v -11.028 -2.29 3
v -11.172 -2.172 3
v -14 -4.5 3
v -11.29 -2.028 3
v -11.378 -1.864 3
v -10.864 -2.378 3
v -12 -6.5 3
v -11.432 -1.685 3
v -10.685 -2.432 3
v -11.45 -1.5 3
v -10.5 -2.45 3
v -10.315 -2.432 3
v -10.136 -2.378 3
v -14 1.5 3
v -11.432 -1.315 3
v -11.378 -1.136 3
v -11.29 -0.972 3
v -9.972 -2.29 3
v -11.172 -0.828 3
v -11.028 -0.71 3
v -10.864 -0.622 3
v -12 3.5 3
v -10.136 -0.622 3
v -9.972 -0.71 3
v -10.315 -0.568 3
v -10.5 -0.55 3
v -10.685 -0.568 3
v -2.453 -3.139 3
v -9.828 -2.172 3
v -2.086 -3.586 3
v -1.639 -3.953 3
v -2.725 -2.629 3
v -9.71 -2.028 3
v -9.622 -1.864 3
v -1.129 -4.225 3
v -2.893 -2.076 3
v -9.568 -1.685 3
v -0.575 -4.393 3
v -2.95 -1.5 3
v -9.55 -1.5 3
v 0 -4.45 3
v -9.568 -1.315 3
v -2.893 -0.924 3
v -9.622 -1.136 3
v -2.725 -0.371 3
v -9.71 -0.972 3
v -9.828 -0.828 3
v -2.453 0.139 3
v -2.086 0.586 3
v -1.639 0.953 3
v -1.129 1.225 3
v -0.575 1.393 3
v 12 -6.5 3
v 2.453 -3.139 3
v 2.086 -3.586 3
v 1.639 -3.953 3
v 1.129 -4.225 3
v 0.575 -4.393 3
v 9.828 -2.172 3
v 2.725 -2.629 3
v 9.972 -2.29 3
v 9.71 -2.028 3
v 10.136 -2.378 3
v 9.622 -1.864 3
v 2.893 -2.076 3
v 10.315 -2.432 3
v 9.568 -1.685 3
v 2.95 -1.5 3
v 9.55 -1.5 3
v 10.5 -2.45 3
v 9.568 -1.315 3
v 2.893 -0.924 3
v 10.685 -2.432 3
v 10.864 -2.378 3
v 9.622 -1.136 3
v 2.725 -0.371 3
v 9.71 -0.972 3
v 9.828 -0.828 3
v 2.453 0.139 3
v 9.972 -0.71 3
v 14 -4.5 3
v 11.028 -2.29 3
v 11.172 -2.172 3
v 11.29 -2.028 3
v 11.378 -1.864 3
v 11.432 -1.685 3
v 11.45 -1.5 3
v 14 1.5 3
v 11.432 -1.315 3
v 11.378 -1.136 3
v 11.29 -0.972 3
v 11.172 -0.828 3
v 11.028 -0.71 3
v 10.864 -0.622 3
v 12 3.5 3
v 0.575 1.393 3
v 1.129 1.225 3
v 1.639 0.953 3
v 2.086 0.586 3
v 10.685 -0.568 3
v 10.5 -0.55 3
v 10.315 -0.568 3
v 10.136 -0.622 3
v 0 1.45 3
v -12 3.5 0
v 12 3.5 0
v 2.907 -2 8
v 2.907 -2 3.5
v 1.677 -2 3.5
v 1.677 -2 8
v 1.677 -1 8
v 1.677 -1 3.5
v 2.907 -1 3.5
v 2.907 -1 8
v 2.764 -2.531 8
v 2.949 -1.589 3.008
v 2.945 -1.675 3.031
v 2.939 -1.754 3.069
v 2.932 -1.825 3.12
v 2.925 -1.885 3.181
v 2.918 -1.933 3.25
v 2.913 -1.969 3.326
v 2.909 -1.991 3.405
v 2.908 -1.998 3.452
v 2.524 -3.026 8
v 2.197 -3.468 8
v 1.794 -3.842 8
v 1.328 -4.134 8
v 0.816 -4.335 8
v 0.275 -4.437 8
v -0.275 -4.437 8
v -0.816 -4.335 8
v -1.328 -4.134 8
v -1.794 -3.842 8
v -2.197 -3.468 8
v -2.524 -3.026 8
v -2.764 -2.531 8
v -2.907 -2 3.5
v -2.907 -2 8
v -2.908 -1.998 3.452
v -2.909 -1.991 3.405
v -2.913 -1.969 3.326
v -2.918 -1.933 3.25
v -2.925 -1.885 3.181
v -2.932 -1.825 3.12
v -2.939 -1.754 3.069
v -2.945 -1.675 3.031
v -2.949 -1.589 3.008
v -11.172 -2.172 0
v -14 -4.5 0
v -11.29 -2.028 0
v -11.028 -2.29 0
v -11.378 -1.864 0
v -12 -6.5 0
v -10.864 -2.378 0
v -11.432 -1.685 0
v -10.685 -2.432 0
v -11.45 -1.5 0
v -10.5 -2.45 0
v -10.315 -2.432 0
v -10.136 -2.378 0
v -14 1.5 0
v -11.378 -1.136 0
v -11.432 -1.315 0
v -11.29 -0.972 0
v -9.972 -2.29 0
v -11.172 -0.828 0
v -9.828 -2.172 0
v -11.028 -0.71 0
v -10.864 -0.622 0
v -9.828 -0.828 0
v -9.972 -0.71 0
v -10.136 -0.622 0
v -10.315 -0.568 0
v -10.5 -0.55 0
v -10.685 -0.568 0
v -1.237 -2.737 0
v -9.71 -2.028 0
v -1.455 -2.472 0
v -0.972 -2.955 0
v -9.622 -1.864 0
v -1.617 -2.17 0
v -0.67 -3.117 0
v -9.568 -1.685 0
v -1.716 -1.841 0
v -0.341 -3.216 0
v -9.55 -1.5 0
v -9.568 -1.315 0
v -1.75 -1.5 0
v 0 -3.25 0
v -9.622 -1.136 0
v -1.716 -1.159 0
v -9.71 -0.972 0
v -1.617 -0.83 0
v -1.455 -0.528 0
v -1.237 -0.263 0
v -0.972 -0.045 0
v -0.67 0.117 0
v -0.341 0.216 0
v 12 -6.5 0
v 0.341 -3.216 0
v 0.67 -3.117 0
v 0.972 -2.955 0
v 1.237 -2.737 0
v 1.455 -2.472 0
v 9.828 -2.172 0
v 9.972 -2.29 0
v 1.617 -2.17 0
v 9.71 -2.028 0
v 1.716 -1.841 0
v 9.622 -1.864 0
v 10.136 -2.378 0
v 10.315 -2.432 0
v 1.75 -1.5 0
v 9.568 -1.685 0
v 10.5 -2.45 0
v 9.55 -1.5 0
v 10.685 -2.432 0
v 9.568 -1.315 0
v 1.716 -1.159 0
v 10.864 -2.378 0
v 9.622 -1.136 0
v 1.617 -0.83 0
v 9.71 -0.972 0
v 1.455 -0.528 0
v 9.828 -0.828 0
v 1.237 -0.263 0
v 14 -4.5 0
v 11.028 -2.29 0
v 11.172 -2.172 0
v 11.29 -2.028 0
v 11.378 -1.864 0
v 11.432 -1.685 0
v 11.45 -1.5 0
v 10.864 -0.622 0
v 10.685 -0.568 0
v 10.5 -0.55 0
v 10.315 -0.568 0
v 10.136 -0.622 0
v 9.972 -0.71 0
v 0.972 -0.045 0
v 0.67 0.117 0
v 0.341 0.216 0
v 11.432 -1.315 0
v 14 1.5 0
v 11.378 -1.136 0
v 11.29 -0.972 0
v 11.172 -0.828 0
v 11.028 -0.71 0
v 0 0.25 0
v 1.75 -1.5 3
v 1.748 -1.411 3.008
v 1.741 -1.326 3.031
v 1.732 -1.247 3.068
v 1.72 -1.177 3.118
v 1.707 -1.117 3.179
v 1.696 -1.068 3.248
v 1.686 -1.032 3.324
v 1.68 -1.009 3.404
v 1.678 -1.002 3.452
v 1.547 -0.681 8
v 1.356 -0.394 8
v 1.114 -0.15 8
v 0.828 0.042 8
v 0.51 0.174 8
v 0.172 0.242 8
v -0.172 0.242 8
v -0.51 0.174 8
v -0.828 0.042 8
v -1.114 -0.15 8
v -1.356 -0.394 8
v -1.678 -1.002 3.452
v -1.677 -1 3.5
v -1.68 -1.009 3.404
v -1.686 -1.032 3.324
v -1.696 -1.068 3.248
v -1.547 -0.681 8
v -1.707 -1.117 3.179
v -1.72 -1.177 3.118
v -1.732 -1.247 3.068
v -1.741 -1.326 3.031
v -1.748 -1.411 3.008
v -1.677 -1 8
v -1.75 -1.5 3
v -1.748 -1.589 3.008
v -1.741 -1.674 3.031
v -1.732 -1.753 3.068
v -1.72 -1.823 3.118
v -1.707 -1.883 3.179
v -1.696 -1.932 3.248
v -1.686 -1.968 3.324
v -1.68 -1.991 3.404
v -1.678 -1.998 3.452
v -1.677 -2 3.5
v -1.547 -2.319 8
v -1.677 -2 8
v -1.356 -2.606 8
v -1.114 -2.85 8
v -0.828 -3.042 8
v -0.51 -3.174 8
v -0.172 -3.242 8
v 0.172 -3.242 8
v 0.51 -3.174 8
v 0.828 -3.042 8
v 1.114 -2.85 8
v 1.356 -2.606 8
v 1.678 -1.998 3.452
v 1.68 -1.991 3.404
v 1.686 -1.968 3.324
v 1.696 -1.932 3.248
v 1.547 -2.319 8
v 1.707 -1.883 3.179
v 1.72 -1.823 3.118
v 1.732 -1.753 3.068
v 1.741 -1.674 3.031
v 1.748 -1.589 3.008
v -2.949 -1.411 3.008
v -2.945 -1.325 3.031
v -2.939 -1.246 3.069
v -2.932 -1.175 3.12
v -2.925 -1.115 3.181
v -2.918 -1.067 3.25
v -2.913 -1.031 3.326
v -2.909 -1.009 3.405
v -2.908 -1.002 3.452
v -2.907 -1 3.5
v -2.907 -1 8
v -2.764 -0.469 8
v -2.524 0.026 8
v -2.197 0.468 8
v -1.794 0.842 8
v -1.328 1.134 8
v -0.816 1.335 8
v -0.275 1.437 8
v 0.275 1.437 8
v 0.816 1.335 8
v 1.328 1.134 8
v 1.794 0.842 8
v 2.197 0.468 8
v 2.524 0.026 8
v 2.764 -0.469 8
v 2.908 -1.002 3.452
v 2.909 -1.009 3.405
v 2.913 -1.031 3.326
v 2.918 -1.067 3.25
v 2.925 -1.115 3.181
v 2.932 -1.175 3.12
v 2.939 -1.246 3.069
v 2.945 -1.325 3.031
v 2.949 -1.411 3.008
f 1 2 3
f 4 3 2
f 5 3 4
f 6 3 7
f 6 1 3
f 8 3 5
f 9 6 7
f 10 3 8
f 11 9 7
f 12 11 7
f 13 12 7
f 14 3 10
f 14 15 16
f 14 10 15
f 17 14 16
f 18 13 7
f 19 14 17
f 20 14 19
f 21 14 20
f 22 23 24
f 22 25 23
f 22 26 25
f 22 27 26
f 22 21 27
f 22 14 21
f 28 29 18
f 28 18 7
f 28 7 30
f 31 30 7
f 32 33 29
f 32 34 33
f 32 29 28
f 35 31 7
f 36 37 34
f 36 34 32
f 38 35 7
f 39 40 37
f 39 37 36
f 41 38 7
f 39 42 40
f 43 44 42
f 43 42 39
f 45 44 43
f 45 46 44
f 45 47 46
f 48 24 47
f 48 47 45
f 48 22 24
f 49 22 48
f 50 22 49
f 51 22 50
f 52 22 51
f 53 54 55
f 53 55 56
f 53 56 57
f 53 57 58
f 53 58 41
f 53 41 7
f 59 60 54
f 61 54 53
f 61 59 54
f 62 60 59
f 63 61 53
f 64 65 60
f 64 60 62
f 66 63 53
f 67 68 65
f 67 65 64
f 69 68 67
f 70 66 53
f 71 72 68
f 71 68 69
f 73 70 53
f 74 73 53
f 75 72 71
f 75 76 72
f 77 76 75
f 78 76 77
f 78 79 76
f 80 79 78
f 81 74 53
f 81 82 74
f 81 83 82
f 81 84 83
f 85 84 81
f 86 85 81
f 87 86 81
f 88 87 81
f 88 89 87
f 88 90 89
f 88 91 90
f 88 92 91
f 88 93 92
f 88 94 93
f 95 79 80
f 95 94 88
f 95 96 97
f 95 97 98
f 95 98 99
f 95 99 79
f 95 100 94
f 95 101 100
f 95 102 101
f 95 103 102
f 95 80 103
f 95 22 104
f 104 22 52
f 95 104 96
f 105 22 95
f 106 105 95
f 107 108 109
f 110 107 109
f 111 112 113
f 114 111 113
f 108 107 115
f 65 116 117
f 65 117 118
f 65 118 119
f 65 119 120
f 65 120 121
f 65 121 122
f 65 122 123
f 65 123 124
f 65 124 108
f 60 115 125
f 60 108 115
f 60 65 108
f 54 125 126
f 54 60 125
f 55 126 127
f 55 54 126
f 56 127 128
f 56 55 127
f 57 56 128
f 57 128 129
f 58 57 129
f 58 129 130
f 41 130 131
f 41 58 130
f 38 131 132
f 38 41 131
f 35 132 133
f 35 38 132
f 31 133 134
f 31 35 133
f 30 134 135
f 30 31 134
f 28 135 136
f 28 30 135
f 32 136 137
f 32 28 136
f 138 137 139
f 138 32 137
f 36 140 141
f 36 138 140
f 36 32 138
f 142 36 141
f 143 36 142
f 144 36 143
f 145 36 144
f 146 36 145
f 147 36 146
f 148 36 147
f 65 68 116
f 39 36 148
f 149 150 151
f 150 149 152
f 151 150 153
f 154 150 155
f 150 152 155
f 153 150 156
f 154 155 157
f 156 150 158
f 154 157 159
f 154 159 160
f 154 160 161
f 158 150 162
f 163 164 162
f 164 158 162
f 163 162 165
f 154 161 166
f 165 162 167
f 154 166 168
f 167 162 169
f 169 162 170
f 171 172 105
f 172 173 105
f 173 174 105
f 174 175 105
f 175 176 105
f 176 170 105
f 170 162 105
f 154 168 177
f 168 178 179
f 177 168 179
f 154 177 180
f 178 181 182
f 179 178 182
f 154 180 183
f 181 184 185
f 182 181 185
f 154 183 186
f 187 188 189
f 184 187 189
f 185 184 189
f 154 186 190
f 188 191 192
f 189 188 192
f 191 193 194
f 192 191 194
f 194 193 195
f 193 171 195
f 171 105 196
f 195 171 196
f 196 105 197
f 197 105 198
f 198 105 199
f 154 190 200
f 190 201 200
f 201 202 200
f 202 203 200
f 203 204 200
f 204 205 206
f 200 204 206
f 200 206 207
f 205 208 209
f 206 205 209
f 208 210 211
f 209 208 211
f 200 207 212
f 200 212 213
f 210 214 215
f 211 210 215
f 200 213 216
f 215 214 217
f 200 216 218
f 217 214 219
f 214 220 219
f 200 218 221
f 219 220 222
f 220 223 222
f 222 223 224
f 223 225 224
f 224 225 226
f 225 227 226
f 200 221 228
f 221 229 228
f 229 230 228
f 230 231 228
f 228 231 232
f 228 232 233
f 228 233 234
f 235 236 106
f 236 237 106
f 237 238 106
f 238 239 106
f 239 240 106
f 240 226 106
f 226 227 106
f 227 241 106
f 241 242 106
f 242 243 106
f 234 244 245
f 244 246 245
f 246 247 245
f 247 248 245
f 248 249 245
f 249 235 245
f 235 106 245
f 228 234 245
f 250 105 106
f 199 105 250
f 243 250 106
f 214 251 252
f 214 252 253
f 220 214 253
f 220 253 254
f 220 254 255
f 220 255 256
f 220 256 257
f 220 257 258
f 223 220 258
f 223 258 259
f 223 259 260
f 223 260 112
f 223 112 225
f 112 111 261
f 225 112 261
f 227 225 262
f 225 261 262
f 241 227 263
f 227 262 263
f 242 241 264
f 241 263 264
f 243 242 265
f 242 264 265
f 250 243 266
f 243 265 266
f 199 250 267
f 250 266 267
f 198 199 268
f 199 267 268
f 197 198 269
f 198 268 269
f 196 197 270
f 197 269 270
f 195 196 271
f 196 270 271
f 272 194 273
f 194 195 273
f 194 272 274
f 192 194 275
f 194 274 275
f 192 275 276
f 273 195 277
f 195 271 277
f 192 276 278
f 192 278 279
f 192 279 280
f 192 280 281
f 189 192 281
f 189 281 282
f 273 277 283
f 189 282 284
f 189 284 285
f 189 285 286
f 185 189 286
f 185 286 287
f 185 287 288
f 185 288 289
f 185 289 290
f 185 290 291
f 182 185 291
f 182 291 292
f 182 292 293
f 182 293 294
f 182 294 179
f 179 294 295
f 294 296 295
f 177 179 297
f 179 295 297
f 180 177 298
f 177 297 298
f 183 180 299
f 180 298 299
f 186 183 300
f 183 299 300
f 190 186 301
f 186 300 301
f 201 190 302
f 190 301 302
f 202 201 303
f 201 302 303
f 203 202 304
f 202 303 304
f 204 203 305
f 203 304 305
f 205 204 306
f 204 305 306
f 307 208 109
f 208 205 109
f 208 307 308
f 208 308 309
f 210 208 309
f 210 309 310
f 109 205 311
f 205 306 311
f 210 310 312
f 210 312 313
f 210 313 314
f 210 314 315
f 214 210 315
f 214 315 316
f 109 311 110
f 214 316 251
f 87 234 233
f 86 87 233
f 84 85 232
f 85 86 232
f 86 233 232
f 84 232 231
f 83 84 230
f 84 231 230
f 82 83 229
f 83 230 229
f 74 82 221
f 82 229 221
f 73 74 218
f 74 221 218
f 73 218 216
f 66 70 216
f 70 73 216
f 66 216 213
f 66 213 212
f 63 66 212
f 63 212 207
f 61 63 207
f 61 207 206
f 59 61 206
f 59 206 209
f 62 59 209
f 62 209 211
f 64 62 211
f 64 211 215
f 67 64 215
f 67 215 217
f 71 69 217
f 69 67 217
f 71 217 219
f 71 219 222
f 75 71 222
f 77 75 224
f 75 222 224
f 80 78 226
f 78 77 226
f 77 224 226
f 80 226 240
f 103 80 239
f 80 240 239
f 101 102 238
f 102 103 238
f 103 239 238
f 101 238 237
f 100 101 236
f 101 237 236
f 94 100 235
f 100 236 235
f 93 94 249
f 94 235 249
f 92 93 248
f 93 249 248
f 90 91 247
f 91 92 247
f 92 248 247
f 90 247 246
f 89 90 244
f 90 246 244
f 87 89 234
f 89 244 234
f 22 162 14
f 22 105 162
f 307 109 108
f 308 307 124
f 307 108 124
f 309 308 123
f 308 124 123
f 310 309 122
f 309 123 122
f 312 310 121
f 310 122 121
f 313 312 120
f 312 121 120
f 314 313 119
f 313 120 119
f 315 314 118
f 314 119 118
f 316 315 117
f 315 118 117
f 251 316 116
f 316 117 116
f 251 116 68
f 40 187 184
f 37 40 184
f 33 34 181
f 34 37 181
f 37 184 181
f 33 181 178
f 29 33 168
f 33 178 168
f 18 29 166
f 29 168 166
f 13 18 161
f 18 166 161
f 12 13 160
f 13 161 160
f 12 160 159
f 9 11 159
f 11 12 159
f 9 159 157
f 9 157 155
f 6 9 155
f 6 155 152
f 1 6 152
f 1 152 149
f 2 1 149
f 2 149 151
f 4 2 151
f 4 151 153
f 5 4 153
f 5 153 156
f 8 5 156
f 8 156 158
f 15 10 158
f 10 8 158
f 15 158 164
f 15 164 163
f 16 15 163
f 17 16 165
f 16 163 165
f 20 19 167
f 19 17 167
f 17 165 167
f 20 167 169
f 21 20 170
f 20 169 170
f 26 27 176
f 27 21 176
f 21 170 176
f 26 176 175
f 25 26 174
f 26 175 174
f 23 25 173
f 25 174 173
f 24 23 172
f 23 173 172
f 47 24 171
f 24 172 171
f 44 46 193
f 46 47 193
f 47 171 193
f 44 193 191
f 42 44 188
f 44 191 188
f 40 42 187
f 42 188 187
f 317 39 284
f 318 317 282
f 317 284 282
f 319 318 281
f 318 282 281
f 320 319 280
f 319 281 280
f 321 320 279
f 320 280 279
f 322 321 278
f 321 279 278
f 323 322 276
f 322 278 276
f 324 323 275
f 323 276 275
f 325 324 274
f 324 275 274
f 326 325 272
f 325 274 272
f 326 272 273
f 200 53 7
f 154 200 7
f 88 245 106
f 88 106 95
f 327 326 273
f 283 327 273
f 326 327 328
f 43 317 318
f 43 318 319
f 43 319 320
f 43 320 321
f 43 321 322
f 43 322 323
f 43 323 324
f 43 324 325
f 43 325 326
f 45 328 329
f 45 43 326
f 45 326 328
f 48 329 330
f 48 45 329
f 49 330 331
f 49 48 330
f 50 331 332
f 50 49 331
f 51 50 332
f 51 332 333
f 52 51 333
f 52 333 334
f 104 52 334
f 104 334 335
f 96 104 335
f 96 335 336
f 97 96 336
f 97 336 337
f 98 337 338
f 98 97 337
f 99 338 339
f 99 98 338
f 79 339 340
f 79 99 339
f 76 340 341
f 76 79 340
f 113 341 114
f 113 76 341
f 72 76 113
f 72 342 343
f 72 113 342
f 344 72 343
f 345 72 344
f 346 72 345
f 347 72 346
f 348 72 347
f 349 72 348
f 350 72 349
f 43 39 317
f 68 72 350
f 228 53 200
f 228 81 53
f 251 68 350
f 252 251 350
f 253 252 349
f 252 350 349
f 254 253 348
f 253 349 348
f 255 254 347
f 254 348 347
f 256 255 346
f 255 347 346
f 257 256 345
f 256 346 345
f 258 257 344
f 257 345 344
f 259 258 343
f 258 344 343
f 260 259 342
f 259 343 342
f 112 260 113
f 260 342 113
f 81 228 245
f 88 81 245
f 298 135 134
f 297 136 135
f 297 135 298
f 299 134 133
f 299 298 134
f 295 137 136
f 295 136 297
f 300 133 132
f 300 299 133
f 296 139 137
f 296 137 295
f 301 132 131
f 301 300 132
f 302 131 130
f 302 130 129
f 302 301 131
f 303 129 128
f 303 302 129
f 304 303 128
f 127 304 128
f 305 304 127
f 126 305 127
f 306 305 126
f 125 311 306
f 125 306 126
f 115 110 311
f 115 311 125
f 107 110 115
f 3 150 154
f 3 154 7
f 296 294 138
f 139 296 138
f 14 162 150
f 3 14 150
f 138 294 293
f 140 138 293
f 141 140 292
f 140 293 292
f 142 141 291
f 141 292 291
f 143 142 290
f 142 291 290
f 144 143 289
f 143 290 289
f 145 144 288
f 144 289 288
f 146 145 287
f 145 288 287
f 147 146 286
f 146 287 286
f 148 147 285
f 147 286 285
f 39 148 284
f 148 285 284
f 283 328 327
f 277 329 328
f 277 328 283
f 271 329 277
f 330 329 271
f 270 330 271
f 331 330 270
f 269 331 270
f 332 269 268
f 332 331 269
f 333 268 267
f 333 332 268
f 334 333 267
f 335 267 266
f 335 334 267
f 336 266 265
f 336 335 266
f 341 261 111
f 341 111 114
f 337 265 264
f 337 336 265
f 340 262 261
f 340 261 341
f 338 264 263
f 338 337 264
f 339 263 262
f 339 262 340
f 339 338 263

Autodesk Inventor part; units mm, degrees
ref_plane "YZ Plane" through (0, 0, 0) normal (1, 0, 0) x (0, 1, 0)
ref_plane "XZ Plane" through (0, 0, 0) normal (0, 1, 0) x (-1, 0, 0)
ref_plane "XY Plane" through (0, 0, 0) normal (0, 0, 1) x (1, 0, 0)
sketch "Sketch1" plane through (0, 0, 0) normal (0, 0, 1) x (1, 0, 0)
  circle A0 centre (10.5, -1.5) radius 0.95 projected
  circle A1 centre (-10.5, -1.5) radius 0.95 projected
  line L0 (14, 9) -> (-14, 9) projected
  line L1 (-14, 9) -> (-14, -9) projected
  line L2 (-14, -9) -> (-7.5, -9) projected
  line L3 (-7.5, -9) -> (-7.5, -1.5) projected
  arc A2 (7.5, -1.5) -> (-7.5, -1.5) centre (0, -1.5) ccw projected
  line L4 (7.5, -1.5) -> (7.5, -9) projected
  line L5 (7.5, -9) -> (14, -9) projected
  line L6 (14, -9) -> (14, 9) projected
  line L7 (-7.5, -9) -> (7.5, -9)
  point P0 (0, 0)
extrude "Extrusion1" add sketch "Sketch1" along normal blind 3
sketch "Sketch2" plane through (0, 0, 3) normal (0, 0, 1) x (1, 0, 0)
  circle A0 centre (0, -1.5) radius 3 projected
  circle A1 centre (0, -1.5) radius 2.95
  point P0 (0, 0)
  dimension "d4" = 5.9
extrude "Extrusion2" add sketch "Sketch2" along normal blind 5 contours A1
sketch "Sketch3" plane through (0, -1.5, 8) normal (0, 0, 1) x (1, 0, 0)
  circle A0 centre (0, 0) radius 2.95 projected
  circle A1 centre (0, 0) radius 1.75
  point P0 (0, 1.5)
  dimension "d7" = 3.5
extrude "Extrusion3" cut sketch "Sketch3" against normal blind 8 contours A1
sketch "Sketch4" plane through (0, 0, 3) normal (0, 0, 1) x (1, 0, 0)
  circle A0 centre (0, -1.5) radius 2.95 projected
  line L0 (14, -9) -> (14, 9) projected
  line L1 (14, 9) -> (-14, 9) projected
  line L2 (-14, 9) -> (-14, -9) projected
  line L3 (-14, -9) -> (14, -9) projected
  circle A1 centre (10.5, -1.5) radius 0.95 projected
  circle A2 centre (-10.5, -1.5) radius 0.95 projected
  line L4 (-5, -2) -> (-5, -1)
  line L5 (-5, -1) -> (5, -1)
  line L6 (5, -1) -> (5, -2)
  line L7 (5, -2) -> (-5, -2)
  line L8 (-5, -2) -> (5, -1) construction
  line L9 (-5, -1) -> (5, -2) construction
  point P0 (0, 0)
  dimension "d10" = 1
  dimension "d11" = 10
extrude "Extrusion4" cut sketch "Sketch4" along normal up to surface (5 mm away) contours A0 L7 L5 | A0 L5 L6 L7 | A0 L7 L4 L5
fillet "Fillet1" radius 0.5 4 edges at (2.2922, -2, 3) (-2.2922, -2, 3) (2.2922, -1, 3) (-2.2922, -1, 3)
sketch "Sketch5" plane through (0, 0, 3) normal (0, 0, 1) x (1, 0, 0)
  arc A0 (2.95, -1.5) -> (-2.95, -1.5) centre (0, -1.5) ccw projected
  arc A1 (-2.95, -1.5) -> (2.95, -1.5) centre (0, -1.5) ccw projected
  line L0 (14, -9) -> (14, 9) projected
  line L1 (14, 9) -> (-14, 9) projected
  line L2 (-14, 9) -> (-14, -9) projected
  line L3 (-14, -9) -> (14, -9) projected
  circle A2 centre (10.5, -1.5) radius 0.95 projected
  circle A3 centre (-10.5, -1.5) radius 0.95 projected
  line L4 (-17.5, -6.5) -> (-17.5, 3.5)
  line L5 (-17.5, 3.5) -> (17.5, 3.5)
  line L6 (17.5, 3.5) -> (17.5, -6.5)
  line L7 (17.5, -6.5) -> (-17.5, -6.5)
  line L8 (-17.5, -6.5) -> (17.5, 3.5) construction
  line L9 (-17.5, 3.5) -> (17.5, -6.5) construction
  point P0 (0, 0)
  point P1 (-14, 3.5)
  point P2 (14, 3.5)
  point P3 (14, -6.5)
  point P4 (-14, -6.5)
  dimension "d15" = 10
  dimension "d16" = 35
extrude "Extrusion5" cut sketch "Sketch5" against normal blind 8 contours L3 L2 L7 L0 | L5 L2 L1 L0
chamfer "Chamfer1" distance 2 angle 45 4 edges at (-14, 3.5, 1.5) (-14, -6.5, 1.5) (14, 3.5, 1.5) (14, -6.5, 1.5)
properties part number "pin_1"
